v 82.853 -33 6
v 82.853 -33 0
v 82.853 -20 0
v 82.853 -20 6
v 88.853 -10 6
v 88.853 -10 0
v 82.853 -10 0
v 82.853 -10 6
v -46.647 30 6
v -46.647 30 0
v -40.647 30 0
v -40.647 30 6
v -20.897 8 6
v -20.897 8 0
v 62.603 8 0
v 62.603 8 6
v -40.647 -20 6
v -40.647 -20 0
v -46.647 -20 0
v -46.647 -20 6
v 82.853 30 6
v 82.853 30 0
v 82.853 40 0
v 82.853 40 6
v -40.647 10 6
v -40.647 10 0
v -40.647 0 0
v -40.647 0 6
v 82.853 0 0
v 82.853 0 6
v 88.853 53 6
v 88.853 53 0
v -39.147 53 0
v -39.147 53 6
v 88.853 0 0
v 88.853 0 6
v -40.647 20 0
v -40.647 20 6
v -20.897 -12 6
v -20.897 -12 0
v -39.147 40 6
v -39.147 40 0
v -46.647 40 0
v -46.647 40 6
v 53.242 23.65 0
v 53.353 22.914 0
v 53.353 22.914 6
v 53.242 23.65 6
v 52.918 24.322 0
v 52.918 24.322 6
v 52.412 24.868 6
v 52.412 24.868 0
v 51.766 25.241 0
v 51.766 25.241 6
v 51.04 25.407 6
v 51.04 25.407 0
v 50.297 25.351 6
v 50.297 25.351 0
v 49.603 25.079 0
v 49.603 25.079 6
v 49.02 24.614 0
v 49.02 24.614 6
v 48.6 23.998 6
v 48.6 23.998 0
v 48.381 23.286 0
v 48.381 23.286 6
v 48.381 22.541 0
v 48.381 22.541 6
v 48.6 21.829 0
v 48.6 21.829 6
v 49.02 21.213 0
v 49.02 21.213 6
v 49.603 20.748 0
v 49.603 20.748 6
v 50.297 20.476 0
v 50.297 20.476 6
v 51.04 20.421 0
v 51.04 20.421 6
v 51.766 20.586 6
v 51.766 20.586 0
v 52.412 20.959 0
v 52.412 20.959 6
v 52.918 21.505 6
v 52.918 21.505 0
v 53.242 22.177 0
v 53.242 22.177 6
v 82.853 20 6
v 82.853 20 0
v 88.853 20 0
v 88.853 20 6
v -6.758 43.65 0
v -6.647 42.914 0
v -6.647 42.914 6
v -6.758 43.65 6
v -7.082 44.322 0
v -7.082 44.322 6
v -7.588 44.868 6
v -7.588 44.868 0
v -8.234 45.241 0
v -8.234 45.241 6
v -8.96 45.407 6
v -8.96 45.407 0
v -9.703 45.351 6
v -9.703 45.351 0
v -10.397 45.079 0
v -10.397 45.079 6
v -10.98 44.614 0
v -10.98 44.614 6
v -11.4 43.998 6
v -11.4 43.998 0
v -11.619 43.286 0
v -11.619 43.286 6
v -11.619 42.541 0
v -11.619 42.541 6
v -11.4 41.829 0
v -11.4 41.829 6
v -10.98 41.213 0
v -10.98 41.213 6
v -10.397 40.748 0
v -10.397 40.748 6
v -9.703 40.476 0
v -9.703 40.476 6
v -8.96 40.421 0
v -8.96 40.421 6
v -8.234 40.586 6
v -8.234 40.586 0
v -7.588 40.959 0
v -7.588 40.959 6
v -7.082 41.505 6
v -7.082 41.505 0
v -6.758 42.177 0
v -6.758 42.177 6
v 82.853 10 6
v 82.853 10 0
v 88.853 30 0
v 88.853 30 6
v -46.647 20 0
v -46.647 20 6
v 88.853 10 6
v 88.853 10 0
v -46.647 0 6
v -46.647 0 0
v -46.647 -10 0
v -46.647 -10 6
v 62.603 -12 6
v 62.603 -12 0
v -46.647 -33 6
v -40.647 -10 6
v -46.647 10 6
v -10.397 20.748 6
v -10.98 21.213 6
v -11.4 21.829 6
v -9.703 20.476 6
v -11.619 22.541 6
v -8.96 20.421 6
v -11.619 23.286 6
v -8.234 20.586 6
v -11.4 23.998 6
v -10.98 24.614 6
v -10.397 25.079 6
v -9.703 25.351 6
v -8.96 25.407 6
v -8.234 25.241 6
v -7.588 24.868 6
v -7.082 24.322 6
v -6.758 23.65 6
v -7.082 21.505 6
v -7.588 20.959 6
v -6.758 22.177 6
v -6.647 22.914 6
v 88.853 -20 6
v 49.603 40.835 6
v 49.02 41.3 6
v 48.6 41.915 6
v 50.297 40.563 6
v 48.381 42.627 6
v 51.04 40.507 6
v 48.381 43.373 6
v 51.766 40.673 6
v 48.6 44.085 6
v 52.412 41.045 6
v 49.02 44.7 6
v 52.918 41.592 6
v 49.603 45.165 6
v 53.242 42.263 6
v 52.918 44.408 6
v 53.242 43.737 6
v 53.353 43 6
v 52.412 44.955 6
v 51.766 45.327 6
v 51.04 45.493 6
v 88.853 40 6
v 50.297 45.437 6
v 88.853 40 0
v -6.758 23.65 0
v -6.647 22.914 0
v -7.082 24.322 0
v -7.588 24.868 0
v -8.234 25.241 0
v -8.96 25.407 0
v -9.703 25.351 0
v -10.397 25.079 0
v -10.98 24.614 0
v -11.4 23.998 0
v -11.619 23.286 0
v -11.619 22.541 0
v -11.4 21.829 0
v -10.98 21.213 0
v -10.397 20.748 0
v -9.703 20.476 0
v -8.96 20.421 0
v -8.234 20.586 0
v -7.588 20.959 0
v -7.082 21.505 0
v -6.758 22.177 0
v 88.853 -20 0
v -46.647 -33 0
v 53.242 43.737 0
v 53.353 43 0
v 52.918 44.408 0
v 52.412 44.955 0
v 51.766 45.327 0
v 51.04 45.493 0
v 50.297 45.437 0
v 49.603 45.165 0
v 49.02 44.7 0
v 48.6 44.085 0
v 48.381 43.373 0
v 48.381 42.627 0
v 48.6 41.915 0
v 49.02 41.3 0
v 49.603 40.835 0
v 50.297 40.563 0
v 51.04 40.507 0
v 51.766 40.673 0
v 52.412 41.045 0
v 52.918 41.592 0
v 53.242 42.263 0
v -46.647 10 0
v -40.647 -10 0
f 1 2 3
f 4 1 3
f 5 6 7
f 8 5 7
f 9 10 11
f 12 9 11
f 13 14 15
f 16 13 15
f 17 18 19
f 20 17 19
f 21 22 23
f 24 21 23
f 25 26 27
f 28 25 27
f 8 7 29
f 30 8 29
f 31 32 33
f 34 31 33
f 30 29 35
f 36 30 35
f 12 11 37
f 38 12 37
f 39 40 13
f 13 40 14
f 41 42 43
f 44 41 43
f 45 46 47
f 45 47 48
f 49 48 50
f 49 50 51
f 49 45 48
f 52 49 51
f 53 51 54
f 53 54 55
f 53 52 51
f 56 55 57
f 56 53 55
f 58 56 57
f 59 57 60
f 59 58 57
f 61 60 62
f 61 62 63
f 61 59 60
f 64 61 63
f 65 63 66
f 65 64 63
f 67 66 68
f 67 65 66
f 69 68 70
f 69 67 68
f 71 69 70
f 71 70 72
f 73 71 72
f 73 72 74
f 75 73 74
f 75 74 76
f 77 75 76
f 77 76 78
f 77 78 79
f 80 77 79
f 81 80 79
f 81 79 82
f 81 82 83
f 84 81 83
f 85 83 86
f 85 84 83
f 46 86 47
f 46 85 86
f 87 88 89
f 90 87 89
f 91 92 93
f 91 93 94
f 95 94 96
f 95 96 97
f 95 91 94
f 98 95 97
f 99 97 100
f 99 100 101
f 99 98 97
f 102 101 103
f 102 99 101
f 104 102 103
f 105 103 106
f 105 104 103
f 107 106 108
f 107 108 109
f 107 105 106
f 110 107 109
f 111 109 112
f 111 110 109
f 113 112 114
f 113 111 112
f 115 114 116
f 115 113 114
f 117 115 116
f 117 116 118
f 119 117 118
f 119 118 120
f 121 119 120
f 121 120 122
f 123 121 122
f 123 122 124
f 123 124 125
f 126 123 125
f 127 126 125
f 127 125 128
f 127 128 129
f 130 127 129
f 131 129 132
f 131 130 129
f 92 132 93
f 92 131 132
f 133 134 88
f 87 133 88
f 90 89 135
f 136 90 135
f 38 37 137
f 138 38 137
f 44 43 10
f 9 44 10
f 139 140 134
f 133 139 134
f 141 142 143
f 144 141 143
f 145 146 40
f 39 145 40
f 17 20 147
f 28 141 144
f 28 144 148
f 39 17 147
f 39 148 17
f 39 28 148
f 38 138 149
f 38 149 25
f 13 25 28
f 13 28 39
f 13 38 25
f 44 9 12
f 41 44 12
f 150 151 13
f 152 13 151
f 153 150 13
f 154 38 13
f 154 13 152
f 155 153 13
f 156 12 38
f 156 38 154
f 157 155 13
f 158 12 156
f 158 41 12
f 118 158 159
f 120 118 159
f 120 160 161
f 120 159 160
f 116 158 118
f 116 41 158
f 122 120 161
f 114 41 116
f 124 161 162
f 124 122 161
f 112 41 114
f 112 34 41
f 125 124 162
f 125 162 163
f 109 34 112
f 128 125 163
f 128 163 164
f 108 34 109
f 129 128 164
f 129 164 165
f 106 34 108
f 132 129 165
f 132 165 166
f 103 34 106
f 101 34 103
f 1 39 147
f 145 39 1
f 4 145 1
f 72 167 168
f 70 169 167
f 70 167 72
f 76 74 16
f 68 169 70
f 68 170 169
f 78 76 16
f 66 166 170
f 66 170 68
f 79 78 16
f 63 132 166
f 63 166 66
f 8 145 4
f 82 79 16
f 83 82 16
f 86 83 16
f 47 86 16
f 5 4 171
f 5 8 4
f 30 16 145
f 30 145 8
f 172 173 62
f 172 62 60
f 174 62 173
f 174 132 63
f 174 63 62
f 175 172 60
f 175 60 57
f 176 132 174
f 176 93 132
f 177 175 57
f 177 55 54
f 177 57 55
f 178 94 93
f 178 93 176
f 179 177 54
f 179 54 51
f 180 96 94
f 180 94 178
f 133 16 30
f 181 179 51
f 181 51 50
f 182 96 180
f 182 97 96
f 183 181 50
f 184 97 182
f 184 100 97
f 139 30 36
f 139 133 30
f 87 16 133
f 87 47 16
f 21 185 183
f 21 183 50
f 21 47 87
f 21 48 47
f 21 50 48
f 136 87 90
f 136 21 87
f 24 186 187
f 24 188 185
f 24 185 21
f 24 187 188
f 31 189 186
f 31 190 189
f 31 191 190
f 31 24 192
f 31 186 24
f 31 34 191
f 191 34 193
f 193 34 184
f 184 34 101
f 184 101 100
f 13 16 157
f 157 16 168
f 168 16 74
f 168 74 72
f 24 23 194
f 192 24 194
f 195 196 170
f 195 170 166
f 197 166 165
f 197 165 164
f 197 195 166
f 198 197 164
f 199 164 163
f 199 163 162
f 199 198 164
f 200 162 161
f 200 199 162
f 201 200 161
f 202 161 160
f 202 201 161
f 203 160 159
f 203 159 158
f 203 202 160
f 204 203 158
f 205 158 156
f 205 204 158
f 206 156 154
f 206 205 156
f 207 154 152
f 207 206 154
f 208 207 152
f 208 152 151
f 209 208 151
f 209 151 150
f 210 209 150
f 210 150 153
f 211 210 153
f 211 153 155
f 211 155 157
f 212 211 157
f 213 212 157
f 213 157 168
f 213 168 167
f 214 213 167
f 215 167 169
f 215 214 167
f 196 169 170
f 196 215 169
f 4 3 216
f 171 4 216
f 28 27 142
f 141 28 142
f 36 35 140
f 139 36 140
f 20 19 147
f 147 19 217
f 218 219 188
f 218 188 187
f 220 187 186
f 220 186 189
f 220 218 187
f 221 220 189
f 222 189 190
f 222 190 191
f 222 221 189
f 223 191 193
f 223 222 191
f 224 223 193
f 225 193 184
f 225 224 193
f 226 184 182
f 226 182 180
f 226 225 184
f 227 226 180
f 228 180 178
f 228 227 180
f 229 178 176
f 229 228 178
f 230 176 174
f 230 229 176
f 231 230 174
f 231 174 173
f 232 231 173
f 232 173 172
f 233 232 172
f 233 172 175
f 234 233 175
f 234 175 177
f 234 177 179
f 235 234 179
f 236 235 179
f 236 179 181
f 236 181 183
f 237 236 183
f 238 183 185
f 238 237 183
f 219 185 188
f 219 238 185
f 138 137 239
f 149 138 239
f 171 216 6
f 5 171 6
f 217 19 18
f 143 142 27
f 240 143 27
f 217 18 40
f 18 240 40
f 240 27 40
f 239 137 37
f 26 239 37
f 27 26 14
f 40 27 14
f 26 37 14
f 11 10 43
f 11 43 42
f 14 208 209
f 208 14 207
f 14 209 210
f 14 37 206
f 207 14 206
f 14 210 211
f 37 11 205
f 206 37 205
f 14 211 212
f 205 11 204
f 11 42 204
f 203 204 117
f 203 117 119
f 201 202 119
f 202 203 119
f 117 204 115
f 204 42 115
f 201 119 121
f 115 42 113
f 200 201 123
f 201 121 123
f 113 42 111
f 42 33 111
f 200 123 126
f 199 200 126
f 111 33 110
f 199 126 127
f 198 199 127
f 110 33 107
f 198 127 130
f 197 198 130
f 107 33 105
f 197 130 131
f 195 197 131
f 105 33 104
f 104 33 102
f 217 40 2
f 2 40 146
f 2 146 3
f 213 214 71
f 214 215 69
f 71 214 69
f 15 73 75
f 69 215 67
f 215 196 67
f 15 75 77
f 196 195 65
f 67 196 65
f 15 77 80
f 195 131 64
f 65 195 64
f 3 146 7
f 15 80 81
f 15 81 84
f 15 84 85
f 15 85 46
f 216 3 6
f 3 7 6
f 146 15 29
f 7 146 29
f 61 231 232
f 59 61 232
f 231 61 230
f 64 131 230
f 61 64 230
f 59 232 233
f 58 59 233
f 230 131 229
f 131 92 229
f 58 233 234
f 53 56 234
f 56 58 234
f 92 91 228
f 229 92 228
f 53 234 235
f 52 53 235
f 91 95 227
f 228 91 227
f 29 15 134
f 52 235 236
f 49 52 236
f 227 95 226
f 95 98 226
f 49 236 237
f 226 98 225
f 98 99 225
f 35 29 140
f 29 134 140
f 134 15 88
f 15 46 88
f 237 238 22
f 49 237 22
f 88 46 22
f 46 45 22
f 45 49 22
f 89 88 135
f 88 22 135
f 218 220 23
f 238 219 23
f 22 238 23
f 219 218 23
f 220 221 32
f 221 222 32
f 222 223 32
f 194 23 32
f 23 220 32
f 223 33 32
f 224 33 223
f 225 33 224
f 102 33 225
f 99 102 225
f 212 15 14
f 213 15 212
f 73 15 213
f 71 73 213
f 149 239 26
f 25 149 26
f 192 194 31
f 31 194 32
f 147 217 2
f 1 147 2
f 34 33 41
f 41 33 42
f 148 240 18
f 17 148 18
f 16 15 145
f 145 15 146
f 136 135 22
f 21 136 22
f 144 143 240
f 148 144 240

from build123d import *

# Parameters (mm, degrees)
F0_R     = 2.5
F1_DEPTH = 6


with BuildPart() as f1:
    # F0 (on Top) → F1 (new body)
    with BuildSketch(Plane.XY):
        Polygon((-46.64715, -20), (-46.64715, -33), (82.85285, -33), (82.85285, -20), (88.85285, -20), (88.85285, -12), (88.85285, -10), (82.85285, -10), (82.85285, 0), (88.85285, 0), (88.85285, 10), (82.85285, 10), (82.85285, 20), (88.85285, 20), (88.85285, 30), (82.85285, 30), (82.85285, 40), (88.85285, 40), (88.85285, 53), (-39.14715, 53), (-39.14715, 40), (-46.64715, 40), (-46.64715, 30), (-40.64715, 30), (-40.64715, 20), (-46.64715, 20), (-46.64715, 10), (-40.64715, 10), (-40.64715, 0), (-46.64715, 0), (-46.64715, -10), (-40.64715, -10), (-40.64715, -20), align=None)
        Polygon((62.60285, 8), (62.60285, 0), (62.60285, -12), (-20.89715, -12), (-20.89715, 0), (-20.89715, 8), align=None, mode=Mode.SUBTRACT)
        with Locations((-9.14715, 22.913525)):
            Circle(F0_R, mode=Mode.SUBTRACT)
        with Locations((-9.14715, 42.913525)):
            Circle(F0_R, mode=Mode.SUBTRACT)
        with Locations((50.85285, 22.913525)):
            Circle(F0_R, mode=Mode.SUBTRACT)
        with Locations((50.85285, 43)):
            Circle(F0_R, mode=Mode.SUBTRACT)
    extrude(amount=F1_DEPTH)


solid = f1.part
